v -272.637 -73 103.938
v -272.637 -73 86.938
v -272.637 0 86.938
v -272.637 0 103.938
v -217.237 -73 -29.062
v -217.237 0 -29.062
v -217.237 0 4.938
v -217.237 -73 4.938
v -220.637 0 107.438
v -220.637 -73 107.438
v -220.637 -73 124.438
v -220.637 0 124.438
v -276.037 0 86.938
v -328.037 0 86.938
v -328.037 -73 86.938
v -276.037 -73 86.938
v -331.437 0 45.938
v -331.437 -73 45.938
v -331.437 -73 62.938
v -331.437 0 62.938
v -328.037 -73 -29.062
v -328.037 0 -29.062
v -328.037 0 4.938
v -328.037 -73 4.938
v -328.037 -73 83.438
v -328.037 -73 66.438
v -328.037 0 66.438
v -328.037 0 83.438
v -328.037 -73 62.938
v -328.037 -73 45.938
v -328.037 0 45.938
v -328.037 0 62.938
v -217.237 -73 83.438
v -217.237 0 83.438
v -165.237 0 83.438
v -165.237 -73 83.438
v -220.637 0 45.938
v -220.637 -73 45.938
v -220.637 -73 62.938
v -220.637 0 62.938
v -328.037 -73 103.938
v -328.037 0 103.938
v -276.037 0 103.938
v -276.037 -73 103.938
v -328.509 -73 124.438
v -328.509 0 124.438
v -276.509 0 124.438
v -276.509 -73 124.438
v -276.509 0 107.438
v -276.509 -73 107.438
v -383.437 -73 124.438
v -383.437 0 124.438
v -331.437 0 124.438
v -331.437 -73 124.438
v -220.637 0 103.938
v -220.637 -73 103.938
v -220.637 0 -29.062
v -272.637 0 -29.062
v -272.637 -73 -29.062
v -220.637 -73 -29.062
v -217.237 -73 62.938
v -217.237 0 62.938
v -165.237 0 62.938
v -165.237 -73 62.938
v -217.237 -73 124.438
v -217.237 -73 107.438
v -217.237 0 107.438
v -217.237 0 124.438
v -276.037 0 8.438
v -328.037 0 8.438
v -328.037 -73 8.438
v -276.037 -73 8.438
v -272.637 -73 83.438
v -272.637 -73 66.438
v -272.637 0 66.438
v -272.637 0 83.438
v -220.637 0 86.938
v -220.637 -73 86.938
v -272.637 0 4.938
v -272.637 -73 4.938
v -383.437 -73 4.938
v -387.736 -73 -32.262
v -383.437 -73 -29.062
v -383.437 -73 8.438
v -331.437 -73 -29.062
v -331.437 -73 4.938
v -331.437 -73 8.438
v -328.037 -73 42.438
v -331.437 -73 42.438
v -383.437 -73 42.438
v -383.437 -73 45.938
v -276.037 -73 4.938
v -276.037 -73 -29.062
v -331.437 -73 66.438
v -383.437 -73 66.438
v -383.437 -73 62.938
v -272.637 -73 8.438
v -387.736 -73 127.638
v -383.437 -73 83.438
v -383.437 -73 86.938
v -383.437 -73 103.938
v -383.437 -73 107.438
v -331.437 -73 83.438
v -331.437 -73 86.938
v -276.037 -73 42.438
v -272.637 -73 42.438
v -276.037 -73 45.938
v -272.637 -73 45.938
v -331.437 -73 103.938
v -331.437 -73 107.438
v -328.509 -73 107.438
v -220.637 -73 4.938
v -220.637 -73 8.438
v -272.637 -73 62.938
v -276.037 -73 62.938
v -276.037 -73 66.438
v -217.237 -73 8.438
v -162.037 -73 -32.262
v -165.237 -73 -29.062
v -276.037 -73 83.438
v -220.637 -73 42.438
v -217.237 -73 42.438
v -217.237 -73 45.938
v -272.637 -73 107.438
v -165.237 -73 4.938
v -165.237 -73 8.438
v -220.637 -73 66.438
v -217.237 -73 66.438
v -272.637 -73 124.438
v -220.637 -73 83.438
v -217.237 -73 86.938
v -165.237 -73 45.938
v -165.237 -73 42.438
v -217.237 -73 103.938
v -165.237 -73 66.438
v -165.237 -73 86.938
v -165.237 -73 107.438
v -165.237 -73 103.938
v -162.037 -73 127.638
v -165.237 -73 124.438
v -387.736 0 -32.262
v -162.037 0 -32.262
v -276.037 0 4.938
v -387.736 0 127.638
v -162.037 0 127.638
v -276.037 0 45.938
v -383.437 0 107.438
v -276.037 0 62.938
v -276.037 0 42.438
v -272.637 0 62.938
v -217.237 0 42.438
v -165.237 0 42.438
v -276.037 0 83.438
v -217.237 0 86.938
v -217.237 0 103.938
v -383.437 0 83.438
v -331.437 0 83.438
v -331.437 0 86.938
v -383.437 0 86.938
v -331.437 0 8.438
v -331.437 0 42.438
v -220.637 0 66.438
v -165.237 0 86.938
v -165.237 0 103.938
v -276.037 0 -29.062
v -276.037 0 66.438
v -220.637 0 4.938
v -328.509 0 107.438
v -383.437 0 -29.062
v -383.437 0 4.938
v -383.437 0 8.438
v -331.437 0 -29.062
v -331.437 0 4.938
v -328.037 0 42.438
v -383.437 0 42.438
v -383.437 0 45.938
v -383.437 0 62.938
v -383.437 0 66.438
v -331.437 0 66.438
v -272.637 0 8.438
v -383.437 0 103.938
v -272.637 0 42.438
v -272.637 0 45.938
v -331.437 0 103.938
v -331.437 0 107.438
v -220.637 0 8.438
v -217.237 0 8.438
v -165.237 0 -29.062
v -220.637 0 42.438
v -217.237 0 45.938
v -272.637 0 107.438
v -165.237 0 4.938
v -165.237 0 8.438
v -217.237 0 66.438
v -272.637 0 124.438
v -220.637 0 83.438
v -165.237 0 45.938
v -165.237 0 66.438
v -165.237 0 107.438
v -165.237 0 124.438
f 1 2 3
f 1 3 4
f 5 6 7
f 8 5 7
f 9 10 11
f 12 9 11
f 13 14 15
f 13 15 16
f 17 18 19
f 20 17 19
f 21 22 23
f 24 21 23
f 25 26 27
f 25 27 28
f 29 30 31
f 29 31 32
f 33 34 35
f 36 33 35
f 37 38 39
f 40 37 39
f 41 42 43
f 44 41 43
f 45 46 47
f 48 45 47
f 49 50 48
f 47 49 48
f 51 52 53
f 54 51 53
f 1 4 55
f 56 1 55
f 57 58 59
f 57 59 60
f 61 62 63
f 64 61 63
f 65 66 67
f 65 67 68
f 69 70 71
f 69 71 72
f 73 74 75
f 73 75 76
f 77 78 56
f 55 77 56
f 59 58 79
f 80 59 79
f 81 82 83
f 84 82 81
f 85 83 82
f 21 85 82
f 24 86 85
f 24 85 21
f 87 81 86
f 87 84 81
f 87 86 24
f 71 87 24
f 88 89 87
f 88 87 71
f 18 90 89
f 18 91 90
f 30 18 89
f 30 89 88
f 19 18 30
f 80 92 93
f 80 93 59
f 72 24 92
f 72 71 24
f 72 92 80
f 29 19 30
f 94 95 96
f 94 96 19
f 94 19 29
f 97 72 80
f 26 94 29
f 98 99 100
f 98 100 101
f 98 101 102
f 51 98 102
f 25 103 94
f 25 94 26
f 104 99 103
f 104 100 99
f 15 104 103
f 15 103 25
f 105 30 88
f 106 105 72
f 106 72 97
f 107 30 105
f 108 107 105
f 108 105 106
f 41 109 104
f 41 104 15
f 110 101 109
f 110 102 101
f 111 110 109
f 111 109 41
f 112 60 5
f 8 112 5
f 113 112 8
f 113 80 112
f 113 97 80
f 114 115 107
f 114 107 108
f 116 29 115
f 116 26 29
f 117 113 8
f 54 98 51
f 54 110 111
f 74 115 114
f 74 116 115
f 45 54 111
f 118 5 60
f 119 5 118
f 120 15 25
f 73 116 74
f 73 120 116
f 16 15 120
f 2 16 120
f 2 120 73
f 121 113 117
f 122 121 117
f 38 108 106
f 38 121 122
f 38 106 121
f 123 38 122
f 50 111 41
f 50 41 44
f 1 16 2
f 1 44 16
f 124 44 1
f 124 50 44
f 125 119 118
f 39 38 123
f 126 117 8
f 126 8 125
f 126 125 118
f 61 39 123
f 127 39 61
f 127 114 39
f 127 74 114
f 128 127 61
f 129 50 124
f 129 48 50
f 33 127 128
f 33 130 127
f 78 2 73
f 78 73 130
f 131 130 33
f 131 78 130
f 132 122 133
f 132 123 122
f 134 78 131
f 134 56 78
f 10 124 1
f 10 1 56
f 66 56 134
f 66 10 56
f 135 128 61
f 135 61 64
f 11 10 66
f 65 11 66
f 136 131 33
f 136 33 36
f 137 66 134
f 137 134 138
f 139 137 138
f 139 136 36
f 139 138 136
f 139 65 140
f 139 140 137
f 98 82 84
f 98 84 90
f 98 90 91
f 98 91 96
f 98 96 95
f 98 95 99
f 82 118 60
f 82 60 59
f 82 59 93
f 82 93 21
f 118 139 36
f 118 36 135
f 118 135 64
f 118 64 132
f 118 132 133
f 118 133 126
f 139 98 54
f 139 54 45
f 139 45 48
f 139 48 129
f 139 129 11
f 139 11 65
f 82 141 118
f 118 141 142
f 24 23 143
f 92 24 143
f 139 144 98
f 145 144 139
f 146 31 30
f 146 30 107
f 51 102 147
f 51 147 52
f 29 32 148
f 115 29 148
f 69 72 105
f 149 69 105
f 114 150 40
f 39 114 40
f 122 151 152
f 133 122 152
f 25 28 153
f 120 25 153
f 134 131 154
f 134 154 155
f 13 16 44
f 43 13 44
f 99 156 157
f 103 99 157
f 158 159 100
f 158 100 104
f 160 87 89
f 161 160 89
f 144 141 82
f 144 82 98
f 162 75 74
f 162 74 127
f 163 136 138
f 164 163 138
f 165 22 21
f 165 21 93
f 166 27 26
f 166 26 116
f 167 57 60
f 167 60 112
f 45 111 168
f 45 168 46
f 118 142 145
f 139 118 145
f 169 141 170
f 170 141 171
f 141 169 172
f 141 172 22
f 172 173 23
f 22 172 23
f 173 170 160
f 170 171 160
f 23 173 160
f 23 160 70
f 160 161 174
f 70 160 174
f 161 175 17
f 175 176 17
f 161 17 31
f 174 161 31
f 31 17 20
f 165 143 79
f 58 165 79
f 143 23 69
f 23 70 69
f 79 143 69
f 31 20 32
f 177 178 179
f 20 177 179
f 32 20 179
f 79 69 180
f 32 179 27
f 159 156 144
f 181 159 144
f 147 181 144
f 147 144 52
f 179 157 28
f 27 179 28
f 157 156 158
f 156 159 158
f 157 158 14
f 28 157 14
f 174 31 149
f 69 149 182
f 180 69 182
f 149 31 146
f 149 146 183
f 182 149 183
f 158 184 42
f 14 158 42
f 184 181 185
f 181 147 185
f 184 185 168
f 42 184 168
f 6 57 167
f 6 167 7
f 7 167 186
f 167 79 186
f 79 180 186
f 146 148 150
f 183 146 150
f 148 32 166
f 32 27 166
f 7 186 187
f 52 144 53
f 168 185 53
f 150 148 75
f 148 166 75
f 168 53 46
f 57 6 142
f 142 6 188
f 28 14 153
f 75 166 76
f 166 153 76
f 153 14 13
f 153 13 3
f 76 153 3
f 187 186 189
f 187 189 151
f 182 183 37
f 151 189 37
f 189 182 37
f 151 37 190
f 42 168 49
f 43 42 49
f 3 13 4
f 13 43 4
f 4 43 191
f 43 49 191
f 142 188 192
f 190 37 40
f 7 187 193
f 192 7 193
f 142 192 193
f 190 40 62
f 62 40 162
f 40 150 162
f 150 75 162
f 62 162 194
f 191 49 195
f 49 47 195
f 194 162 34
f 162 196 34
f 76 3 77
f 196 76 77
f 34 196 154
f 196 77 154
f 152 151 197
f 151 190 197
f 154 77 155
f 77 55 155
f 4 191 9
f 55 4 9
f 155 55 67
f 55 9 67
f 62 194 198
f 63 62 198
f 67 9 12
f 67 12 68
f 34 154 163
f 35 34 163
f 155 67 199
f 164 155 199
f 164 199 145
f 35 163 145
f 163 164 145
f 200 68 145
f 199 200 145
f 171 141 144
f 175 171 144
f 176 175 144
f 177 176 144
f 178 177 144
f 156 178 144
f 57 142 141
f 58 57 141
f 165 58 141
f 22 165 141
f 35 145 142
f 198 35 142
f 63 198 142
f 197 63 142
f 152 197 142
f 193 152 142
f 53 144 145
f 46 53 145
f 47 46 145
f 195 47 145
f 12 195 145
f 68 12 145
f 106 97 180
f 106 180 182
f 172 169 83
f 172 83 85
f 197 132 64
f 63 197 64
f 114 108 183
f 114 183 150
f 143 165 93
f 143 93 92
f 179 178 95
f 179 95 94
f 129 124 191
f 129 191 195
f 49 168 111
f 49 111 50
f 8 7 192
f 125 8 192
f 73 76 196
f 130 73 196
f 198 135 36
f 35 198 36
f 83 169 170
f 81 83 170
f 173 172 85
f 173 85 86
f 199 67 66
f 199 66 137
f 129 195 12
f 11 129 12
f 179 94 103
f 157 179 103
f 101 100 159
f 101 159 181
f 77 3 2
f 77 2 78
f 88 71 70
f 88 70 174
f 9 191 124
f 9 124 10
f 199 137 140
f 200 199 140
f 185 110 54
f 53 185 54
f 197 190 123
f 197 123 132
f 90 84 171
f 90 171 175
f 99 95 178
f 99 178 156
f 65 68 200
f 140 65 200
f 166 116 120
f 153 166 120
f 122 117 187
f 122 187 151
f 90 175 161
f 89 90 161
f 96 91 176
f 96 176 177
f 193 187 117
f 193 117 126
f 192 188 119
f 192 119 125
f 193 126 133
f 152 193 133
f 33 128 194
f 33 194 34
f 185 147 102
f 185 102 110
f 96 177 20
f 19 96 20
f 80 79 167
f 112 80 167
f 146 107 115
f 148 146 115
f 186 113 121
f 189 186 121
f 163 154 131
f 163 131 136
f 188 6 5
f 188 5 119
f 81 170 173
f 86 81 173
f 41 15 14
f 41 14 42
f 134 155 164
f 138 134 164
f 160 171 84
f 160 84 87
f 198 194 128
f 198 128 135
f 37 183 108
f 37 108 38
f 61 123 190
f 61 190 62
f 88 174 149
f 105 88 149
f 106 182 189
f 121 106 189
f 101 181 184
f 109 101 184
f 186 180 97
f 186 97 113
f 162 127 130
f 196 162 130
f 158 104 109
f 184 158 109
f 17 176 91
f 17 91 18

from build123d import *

# Parameters (mm, degrees)
F0_W     = 225.699038
F0_H     = 159.9
F0_W_2   = 52
F0_H_2   = 34
F0_H_3   = 17
F1_DEPTH = 73


with BuildPart() as f1:
    # F0 (on Front) → F1 (new body)
    with BuildSketch(Plane.XZ):
        with Locations((-274.886772, 47.687937)):
            Rectangle(F0_W, F0_H)
        with Locations((-357.437253, -12.062063)):
            Rectangle(F0_W_2, F0_H_2, mode=Mode.SUBTRACT)
        with Locations((-302.037253, -12.062063)):
            Rectangle(F0_W_2, F0_H_2, mode=Mode.SUBTRACT)
        with Locations((-357.437253, 25.437937)):
            Rectangle(F0_W_2, F0_H_2, mode=Mode.SUBTRACT)
        with Locations((-302.037253, 25.437937)):
            Rectangle(F0_W_2, F0_H_2, mode=Mode.SUBTRACT)
        with Locations((-246.637253, -12.062063)):
            Rectangle(F0_W_2, F0_H_2, mode=Mode.SUBTRACT)
        with Locations((-191.237253, -12.062063)):
            Rectangle(F0_W_2, F0_H_2, mode=Mode.SUBTRACT)
        with Locations((-246.637253, 25.437937)):
            Rectangle(F0_W_2, F0_H_2, mode=Mode.SUBTRACT)
        with Locations((-191.237253, 25.437937)):
            Rectangle(F0_W_2, F0_H_2, mode=Mode.SUBTRACT)
        with Locations((-357.437253, 54.437937)):
            Rectangle(F0_W_2, F0_H_3, mode=Mode.SUBTRACT)
        with Locations((-357.437253, 74.937937)):
            Rectangle(F0_W_2, F0_H_3, mode=Mode.SUBTRACT)
        with Locations((-302.037253, 54.437937)):
            Rectangle(F0_W_2, F0_H_3, mode=Mode.SUBTRACT)
        with Locations((-302.037253, 74.937937)):
            Rectangle(F0_W_2, F0_H_3, mode=Mode.SUBTRACT)
        with Locations((-357.437253, 95.437937)):
            Rectangle(F0_W_2, F0_H_3, mode=Mode.SUBTRACT)
        with Locations((-357.437253, 115.937937)):
            Rectangle(F0_W_2, F0_H_3, mode=Mode.SUBTRACT)
        with Locations((-302.037253, 95.437937)):
            Rectangle(F0_W_2, F0_H_3, mode=Mode.SUBTRACT)
        with Locations((-302.508703, 115.937937)):
            Rectangle(F0_W_2, F0_H_3, mode=Mode.SUBTRACT)
        with Locations((-246.637253, 54.437937)):
            Rectangle(F0_W_2, F0_H_3, mode=Mode.SUBTRACT)
        with Locations((-246.637253, 74.937937)):
            Rectangle(F0_W_2, F0_H_3, mode=Mode.SUBTRACT)
        with Locations((-191.237253, 54.437937)):
            Rectangle(F0_W_2, F0_H_3, mode=Mode.SUBTRACT)
        with Locations((-191.237253, 74.937937)):
            Rectangle(F0_W_2, F0_H_3, mode=Mode.SUBTRACT)
        with Locations((-246.637253, 95.437937)):
            Rectangle(F0_W_2, F0_H_3, mode=Mode.SUBTRACT)
        with Locations((-246.637253, 115.937937)):
            Rectangle(F0_W_2, F0_H_3, mode=Mode.SUBTRACT)
        with Locations((-191.237253, 95.437937)):
            Rectangle(F0_W_2, F0_H_3, mode=Mode.SUBTRACT)
        with Locations((-191.237253, 115.937937)):
            Rectangle(F0_W_2, F0_H_3, mode=Mode.SUBTRACT)
    extrude(amount=F1_DEPTH)


solid = f1.part
